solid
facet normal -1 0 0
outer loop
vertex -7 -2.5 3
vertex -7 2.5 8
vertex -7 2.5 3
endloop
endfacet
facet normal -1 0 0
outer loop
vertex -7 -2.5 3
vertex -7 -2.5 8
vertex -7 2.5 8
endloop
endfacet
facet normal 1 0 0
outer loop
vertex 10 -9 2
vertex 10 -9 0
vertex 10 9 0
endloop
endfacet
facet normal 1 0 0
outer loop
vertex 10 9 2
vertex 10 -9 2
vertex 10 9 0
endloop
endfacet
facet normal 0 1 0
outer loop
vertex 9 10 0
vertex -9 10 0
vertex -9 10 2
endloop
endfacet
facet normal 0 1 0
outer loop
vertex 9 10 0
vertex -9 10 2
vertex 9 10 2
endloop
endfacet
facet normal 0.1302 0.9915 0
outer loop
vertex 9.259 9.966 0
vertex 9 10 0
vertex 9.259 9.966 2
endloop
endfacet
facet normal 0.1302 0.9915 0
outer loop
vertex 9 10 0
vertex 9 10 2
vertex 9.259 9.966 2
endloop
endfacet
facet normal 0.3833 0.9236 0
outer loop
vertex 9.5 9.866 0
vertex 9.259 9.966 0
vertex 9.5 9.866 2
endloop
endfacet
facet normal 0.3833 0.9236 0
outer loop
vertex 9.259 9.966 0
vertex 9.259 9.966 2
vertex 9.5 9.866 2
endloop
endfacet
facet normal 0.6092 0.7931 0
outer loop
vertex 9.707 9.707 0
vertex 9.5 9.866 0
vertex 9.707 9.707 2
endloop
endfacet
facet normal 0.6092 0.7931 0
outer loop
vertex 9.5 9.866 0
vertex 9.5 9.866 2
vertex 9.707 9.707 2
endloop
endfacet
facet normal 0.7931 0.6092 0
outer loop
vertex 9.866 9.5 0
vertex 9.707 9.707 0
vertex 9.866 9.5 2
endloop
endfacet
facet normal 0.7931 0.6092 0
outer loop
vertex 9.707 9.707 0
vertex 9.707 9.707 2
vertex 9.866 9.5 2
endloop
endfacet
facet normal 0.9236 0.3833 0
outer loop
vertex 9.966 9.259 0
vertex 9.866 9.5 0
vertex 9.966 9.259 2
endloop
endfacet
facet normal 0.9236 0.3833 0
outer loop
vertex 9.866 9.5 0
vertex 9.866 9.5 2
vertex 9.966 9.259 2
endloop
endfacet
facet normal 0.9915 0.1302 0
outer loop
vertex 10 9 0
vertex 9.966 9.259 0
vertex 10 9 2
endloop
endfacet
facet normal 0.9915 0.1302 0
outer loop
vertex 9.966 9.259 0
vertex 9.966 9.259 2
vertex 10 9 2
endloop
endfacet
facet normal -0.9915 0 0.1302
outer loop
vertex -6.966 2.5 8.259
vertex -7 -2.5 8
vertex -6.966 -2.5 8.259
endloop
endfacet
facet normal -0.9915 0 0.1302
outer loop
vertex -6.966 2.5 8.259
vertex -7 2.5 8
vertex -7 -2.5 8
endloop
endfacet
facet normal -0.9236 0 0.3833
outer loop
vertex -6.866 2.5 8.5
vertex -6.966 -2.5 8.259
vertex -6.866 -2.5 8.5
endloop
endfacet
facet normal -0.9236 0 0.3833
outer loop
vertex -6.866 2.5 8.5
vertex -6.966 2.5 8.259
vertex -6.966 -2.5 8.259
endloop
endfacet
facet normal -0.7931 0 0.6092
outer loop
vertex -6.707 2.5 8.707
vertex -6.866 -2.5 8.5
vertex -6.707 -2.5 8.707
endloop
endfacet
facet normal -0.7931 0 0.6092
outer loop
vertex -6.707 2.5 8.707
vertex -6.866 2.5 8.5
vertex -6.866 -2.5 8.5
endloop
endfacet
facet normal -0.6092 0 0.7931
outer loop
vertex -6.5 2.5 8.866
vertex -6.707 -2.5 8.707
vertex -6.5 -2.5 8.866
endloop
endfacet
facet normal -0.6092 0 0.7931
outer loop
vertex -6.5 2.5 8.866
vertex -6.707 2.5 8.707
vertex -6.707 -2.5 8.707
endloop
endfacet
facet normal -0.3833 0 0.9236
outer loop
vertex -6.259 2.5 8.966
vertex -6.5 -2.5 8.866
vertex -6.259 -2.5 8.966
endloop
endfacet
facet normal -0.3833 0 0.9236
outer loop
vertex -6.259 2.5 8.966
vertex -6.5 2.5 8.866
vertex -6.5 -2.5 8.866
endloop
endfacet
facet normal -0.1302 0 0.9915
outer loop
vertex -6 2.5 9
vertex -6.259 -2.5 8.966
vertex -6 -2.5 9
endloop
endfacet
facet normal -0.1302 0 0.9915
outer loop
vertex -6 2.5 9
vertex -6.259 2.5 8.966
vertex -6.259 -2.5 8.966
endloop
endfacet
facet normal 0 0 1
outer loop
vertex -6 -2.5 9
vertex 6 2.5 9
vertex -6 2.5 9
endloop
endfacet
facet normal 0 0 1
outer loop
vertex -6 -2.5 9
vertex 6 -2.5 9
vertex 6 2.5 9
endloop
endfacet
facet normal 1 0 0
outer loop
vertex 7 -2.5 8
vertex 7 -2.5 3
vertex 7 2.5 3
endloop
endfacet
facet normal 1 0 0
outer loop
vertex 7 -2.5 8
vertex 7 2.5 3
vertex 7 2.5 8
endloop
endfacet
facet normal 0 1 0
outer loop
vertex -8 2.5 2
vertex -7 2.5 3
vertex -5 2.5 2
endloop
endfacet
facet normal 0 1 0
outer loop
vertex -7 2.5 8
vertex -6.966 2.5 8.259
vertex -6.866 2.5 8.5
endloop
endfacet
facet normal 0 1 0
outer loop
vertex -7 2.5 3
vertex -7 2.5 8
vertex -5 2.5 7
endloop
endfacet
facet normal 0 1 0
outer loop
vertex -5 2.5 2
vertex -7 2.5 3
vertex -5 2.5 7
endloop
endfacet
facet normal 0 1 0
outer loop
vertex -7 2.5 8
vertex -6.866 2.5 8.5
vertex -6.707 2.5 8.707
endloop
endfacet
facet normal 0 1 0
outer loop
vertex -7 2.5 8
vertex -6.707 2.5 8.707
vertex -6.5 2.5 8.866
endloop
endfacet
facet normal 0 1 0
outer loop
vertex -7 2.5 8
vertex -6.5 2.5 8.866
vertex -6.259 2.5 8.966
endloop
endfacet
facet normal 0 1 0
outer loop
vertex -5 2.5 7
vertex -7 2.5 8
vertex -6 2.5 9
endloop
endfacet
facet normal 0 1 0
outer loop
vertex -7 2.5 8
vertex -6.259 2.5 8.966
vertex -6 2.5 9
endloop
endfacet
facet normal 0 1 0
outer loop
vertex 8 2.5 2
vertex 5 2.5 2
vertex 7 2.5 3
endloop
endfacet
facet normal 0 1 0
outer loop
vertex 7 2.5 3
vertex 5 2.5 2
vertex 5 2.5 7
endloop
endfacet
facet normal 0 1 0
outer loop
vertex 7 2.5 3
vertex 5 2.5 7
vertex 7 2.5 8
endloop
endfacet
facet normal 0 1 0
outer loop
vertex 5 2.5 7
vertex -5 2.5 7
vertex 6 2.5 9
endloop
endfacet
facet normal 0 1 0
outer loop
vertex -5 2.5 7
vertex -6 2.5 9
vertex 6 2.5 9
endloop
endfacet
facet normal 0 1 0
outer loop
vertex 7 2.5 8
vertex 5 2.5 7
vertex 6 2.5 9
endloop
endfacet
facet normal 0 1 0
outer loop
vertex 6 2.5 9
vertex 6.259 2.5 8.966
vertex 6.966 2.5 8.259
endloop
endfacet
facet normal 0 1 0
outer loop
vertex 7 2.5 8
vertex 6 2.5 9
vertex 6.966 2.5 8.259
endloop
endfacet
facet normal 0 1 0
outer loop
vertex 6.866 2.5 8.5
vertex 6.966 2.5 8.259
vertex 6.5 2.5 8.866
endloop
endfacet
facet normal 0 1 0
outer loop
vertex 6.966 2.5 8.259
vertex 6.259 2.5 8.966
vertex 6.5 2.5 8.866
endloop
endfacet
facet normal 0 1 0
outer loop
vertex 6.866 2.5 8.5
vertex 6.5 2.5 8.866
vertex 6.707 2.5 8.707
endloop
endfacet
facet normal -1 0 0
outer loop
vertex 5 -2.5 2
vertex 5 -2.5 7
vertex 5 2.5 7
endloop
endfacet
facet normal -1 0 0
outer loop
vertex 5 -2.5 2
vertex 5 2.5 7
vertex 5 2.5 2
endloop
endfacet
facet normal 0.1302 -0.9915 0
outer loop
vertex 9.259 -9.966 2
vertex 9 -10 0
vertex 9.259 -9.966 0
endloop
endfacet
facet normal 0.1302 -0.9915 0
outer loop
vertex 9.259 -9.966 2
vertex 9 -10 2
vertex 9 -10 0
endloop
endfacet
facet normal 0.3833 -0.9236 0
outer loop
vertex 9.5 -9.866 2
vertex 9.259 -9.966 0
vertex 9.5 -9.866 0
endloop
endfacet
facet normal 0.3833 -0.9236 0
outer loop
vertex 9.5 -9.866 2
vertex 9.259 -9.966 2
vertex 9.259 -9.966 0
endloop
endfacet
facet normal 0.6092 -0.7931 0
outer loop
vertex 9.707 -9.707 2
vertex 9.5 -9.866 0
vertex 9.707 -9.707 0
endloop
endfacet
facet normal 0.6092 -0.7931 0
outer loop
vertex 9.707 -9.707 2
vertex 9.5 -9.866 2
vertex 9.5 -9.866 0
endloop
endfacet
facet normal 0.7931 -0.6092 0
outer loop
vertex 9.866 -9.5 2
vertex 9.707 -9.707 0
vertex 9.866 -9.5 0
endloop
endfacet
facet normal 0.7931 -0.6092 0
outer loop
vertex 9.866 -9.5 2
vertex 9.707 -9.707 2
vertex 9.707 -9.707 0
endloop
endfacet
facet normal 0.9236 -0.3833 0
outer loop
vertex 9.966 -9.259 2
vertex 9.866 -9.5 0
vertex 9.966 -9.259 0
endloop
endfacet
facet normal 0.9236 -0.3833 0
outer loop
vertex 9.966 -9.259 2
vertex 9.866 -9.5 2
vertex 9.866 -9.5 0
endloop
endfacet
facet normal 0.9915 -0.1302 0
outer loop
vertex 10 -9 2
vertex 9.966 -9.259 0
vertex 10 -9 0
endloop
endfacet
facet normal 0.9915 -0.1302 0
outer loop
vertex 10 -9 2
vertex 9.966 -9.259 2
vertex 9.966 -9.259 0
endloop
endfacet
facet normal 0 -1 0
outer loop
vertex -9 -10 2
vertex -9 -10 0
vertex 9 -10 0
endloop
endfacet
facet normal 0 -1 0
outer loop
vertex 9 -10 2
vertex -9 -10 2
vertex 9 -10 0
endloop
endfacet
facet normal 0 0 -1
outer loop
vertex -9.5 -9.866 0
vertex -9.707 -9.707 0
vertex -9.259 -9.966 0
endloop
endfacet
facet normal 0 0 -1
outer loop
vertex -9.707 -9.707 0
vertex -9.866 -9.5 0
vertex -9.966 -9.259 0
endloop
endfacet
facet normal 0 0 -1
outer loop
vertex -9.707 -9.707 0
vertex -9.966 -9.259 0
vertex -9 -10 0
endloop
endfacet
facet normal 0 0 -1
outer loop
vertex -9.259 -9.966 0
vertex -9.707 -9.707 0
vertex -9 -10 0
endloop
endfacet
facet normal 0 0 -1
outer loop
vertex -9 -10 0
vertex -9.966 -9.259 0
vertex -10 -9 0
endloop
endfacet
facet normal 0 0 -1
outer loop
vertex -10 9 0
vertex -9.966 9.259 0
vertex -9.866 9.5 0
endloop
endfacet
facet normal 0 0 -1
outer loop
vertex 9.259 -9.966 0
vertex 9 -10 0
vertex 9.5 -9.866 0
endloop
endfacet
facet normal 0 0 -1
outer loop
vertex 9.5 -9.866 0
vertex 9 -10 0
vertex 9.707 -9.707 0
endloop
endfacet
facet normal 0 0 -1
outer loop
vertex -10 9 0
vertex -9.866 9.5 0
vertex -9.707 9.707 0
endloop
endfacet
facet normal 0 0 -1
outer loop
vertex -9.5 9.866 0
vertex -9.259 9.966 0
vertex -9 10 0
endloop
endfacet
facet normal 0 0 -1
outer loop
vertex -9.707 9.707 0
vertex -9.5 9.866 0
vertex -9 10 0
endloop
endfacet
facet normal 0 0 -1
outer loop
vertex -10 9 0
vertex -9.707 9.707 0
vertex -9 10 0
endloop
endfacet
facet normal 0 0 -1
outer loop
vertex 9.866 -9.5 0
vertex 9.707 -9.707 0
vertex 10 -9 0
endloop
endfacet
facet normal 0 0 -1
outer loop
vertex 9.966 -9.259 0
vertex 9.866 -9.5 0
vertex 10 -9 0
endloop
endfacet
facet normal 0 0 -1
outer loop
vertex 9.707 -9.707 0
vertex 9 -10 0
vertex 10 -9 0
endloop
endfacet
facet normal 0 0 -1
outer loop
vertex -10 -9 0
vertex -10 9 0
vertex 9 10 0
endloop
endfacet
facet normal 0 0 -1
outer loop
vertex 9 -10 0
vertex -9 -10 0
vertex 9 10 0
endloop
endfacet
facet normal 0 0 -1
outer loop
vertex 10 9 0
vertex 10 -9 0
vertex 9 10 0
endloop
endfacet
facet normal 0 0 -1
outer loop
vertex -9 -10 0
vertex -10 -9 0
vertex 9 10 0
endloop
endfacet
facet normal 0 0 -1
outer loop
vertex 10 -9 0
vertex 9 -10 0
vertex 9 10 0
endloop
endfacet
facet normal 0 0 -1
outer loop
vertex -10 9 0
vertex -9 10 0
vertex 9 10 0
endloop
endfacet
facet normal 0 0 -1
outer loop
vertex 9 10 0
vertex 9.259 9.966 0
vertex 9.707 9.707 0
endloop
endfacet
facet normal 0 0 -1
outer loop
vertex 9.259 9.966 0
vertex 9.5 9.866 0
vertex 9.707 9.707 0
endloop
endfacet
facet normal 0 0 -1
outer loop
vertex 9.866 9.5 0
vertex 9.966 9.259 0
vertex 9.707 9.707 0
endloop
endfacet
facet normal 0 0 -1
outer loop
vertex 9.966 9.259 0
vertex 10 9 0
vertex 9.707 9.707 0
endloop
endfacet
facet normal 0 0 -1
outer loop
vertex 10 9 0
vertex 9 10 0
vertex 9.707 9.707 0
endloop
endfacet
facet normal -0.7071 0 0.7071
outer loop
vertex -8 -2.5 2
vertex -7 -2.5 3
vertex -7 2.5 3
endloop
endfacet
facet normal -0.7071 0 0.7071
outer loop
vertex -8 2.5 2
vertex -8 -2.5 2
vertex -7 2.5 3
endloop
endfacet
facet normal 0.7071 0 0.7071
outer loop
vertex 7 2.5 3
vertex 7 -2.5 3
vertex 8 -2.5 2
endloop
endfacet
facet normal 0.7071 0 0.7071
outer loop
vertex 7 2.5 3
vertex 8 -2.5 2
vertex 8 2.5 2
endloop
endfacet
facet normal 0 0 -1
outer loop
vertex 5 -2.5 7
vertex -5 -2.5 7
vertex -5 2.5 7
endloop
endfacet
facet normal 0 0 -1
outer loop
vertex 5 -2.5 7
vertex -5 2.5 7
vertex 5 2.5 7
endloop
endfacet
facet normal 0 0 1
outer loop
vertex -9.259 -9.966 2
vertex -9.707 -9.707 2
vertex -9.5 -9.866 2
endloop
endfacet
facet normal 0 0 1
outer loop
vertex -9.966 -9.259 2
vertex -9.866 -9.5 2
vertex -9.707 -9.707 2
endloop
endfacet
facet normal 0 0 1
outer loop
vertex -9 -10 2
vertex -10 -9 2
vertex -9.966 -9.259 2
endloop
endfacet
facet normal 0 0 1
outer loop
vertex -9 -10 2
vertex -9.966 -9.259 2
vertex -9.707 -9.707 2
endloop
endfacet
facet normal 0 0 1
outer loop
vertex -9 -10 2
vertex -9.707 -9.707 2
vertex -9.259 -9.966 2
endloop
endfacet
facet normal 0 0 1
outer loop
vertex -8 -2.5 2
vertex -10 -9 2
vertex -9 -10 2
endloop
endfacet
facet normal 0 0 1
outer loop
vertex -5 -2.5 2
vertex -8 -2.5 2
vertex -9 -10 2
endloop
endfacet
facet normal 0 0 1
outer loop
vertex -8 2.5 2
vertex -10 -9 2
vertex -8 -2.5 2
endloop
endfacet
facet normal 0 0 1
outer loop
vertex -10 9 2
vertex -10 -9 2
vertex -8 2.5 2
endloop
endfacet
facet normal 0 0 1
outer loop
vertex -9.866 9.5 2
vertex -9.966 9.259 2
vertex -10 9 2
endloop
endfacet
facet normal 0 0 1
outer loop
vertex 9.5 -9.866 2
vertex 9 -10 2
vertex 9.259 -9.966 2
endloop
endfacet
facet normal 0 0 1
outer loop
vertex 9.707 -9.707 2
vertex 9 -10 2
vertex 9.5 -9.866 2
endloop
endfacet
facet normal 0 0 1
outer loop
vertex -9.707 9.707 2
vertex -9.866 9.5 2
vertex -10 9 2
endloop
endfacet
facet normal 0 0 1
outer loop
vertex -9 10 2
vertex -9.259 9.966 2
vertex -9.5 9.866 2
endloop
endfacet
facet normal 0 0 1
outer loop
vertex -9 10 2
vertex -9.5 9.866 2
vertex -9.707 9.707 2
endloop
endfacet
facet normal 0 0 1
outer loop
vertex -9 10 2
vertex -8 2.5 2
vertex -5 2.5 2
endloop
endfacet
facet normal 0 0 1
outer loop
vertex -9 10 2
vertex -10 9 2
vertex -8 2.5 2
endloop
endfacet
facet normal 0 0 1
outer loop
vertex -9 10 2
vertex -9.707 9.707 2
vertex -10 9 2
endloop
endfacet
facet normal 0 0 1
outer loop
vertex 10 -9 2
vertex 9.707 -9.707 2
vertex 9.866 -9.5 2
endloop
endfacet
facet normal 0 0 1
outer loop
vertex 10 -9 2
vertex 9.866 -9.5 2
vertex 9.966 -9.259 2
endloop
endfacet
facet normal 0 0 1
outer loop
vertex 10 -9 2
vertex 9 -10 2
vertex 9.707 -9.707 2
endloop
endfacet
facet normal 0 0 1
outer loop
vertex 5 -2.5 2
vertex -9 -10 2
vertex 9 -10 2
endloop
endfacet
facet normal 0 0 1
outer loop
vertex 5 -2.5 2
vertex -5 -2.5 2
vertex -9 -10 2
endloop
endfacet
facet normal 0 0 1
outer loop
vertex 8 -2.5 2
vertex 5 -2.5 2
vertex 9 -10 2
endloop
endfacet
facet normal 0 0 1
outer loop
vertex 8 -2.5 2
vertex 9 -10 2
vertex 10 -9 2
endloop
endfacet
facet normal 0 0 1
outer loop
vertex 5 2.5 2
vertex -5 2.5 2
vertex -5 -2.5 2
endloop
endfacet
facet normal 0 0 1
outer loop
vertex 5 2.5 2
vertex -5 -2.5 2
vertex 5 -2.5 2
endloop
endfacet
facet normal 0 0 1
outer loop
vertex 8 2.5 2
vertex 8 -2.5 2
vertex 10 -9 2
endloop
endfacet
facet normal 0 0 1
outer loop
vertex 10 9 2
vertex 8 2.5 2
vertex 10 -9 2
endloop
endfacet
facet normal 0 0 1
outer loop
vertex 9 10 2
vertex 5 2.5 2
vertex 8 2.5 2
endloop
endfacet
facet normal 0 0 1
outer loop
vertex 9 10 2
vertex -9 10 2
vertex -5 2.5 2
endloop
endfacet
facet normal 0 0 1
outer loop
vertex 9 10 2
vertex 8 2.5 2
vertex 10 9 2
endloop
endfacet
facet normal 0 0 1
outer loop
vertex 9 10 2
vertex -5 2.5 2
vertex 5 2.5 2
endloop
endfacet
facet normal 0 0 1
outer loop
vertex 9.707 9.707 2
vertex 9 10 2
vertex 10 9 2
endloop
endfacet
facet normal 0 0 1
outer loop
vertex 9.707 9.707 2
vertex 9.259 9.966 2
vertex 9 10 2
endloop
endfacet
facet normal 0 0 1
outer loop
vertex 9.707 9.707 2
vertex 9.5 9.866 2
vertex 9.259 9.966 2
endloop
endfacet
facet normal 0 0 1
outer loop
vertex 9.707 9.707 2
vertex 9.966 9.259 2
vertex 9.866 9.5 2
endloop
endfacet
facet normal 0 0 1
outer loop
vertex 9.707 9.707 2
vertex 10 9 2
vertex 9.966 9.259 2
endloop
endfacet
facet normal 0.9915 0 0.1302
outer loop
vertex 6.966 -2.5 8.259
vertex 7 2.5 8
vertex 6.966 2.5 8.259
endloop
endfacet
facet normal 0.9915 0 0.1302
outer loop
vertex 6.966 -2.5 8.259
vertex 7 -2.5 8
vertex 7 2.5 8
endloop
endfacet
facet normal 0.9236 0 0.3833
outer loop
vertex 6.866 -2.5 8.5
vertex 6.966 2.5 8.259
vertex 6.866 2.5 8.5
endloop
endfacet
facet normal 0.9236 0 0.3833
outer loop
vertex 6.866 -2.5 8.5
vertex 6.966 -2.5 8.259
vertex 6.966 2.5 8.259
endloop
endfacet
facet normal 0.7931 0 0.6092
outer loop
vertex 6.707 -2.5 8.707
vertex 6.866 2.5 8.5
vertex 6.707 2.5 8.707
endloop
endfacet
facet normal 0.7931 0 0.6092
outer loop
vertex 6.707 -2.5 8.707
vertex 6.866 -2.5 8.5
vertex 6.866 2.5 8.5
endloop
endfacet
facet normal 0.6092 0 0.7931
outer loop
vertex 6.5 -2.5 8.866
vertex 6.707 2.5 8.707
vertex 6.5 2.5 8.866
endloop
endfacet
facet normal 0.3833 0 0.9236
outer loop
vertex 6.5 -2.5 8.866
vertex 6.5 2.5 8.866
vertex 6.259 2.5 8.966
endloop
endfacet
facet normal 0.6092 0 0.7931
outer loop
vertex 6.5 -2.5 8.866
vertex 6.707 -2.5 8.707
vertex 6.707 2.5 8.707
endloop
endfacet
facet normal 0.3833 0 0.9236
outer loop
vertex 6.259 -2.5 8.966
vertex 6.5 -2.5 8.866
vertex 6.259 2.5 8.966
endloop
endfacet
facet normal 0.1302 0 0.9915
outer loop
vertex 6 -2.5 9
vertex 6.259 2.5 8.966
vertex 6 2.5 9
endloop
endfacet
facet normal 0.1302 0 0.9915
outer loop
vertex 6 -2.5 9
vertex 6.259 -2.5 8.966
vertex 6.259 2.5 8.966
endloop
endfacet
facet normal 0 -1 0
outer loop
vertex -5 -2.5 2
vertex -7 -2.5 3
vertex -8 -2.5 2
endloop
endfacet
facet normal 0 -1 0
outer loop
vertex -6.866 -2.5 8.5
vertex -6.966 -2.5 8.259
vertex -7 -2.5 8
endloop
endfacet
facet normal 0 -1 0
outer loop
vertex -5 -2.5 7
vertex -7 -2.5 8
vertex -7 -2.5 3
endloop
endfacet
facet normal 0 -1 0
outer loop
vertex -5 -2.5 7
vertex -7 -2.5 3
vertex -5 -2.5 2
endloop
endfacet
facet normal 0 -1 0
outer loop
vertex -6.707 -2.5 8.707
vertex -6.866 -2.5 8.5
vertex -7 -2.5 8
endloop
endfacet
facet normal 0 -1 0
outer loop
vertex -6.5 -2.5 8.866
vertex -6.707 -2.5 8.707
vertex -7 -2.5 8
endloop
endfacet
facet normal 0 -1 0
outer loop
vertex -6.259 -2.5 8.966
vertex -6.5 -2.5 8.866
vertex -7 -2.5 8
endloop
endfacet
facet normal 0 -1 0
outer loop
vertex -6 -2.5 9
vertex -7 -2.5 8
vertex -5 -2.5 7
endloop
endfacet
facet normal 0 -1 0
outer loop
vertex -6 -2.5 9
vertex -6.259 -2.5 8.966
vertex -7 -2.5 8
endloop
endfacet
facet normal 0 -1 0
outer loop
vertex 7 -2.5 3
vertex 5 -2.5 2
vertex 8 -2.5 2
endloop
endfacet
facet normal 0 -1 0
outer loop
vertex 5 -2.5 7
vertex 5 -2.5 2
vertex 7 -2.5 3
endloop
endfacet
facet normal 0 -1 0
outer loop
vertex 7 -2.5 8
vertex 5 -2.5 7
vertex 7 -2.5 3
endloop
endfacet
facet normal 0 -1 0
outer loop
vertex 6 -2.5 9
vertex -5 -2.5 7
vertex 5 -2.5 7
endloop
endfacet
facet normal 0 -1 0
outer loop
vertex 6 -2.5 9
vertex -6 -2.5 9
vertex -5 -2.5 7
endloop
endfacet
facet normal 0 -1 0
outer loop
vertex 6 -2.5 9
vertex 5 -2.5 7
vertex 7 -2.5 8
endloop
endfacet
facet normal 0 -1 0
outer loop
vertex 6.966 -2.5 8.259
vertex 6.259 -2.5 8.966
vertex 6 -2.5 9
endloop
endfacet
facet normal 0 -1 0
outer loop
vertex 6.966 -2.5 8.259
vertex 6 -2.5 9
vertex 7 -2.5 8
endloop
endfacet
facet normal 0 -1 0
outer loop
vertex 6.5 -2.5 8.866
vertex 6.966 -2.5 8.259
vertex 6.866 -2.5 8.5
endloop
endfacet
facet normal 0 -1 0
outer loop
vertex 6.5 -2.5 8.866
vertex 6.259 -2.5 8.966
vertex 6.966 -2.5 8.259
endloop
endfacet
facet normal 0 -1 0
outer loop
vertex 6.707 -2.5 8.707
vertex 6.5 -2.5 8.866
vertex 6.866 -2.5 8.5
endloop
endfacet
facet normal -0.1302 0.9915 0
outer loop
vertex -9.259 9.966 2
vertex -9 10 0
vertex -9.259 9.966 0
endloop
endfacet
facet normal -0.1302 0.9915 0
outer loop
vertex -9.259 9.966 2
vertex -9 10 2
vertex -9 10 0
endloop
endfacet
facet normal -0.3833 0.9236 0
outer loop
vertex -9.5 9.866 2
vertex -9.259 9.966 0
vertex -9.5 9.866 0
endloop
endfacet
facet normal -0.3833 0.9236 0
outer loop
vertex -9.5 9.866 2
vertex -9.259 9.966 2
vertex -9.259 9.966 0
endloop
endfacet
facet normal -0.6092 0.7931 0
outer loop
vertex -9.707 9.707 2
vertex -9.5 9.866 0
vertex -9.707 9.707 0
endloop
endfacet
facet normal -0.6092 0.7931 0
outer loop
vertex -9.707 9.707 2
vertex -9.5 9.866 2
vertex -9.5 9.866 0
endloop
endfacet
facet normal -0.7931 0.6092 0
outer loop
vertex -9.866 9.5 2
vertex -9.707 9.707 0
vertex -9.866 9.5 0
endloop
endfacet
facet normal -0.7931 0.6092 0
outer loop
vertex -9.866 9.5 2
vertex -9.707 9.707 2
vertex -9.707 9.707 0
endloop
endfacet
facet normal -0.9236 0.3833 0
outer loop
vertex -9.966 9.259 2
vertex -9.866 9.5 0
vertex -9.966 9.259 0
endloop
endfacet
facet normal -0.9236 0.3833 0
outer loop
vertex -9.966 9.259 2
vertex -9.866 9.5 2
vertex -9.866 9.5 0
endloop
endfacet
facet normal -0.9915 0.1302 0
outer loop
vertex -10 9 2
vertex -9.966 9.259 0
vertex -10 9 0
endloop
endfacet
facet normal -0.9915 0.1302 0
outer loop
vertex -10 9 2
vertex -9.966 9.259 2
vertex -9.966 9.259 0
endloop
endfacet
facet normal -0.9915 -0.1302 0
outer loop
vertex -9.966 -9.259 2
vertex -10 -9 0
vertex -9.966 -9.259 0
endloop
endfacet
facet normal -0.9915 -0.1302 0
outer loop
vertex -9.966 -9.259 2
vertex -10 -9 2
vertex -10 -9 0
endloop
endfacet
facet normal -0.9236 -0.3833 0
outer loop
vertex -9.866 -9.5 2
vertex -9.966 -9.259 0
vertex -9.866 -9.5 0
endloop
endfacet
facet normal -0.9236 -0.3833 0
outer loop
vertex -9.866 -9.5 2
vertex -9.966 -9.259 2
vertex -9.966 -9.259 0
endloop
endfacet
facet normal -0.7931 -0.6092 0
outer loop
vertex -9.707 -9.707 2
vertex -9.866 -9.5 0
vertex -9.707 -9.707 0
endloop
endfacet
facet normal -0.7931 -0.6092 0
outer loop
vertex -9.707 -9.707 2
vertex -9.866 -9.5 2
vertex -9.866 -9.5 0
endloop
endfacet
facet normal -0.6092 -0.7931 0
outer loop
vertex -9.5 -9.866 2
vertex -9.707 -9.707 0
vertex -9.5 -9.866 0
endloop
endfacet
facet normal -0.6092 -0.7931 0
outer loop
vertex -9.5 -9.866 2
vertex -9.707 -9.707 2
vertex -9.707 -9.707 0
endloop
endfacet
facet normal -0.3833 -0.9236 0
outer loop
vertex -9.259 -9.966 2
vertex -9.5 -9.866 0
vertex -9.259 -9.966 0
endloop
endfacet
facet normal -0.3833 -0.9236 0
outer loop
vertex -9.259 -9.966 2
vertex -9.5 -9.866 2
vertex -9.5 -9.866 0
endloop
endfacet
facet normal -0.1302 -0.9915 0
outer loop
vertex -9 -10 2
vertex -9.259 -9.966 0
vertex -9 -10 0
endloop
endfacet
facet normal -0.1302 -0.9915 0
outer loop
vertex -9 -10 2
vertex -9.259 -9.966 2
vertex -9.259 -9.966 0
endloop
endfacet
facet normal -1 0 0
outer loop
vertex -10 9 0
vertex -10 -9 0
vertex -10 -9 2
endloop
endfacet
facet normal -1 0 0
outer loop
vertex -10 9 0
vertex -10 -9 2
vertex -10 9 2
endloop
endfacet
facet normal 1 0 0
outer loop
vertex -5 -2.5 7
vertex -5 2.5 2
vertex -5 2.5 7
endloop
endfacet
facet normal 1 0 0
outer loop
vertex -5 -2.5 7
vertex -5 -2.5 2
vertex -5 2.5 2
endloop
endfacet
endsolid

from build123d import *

# Parameters (mm, degrees)
SKETCH_W        = 20
SKETCH_H        = 20
PAD_DEPTH       = 2
PAD001_DEPTH    = 2.5
CHAMFER_SIZE    = 1
CHAMFER001_SIZE = 1
FILLET_R        = 1
FILLET001_R     = 1
FILLET002_R     = 1


with BuildPart() as part:
    # Sketch → Pad (new body)
    with BuildSketch(Plane.XY):
        Rectangle(SKETCH_W, SKETCH_H)
    extrude(amount=PAD_DEPTH)

    # Sketch001 → Pad001 (join, symmetric)
    with BuildSketch(Plane.XZ):
        Polygon((-5, 2), (-5, 7), (5, 7), (5, 1.996067), (7, 1.996067), (7, 9), (-7, 9), (-7, 2), align=None)
    extrude(amount=PAD001_DEPTH, both=True)

    # Chamfer
    chamfer_edges = [part.edges().sort_by_distance(p)[0] for p in [
        (7, 0, 2),
    ]]
    chamfer(chamfer_edges, length=CHAMFER_SIZE)

    # Chamfer001
    chamfer001_edges = [part.edges().sort_by_distance(p)[0] for p in [
        (-7, 0, 2),
    ]]
    chamfer(chamfer001_edges, length=CHAMFER001_SIZE)

    # Fillet
    fillet_edges = [part.edges().sort_by_distance(p)[0] for p in [
        (-10, 10, 1),
    ]]
    fillet(fillet_edges, radius=FILLET_R)

    # Fillet001
    fillet001_edges = [part.edges().sort_by_distance(p)[0] for p in [
        (10, -10, 1),
        (-10, -10, 1),
        (10, 10, 1),
    ]]
    fillet(fillet001_edges, radius=FILLET001_R)

    # Fillet002
    fillet002_edges = [part.edges().sort_by_distance(p)[0] for p in [
        (7, 0, 9),
        (-7, 0, 9),
    ]]
    fillet(fillet002_edges, radius=FILLET002_R)


solid = part.part
